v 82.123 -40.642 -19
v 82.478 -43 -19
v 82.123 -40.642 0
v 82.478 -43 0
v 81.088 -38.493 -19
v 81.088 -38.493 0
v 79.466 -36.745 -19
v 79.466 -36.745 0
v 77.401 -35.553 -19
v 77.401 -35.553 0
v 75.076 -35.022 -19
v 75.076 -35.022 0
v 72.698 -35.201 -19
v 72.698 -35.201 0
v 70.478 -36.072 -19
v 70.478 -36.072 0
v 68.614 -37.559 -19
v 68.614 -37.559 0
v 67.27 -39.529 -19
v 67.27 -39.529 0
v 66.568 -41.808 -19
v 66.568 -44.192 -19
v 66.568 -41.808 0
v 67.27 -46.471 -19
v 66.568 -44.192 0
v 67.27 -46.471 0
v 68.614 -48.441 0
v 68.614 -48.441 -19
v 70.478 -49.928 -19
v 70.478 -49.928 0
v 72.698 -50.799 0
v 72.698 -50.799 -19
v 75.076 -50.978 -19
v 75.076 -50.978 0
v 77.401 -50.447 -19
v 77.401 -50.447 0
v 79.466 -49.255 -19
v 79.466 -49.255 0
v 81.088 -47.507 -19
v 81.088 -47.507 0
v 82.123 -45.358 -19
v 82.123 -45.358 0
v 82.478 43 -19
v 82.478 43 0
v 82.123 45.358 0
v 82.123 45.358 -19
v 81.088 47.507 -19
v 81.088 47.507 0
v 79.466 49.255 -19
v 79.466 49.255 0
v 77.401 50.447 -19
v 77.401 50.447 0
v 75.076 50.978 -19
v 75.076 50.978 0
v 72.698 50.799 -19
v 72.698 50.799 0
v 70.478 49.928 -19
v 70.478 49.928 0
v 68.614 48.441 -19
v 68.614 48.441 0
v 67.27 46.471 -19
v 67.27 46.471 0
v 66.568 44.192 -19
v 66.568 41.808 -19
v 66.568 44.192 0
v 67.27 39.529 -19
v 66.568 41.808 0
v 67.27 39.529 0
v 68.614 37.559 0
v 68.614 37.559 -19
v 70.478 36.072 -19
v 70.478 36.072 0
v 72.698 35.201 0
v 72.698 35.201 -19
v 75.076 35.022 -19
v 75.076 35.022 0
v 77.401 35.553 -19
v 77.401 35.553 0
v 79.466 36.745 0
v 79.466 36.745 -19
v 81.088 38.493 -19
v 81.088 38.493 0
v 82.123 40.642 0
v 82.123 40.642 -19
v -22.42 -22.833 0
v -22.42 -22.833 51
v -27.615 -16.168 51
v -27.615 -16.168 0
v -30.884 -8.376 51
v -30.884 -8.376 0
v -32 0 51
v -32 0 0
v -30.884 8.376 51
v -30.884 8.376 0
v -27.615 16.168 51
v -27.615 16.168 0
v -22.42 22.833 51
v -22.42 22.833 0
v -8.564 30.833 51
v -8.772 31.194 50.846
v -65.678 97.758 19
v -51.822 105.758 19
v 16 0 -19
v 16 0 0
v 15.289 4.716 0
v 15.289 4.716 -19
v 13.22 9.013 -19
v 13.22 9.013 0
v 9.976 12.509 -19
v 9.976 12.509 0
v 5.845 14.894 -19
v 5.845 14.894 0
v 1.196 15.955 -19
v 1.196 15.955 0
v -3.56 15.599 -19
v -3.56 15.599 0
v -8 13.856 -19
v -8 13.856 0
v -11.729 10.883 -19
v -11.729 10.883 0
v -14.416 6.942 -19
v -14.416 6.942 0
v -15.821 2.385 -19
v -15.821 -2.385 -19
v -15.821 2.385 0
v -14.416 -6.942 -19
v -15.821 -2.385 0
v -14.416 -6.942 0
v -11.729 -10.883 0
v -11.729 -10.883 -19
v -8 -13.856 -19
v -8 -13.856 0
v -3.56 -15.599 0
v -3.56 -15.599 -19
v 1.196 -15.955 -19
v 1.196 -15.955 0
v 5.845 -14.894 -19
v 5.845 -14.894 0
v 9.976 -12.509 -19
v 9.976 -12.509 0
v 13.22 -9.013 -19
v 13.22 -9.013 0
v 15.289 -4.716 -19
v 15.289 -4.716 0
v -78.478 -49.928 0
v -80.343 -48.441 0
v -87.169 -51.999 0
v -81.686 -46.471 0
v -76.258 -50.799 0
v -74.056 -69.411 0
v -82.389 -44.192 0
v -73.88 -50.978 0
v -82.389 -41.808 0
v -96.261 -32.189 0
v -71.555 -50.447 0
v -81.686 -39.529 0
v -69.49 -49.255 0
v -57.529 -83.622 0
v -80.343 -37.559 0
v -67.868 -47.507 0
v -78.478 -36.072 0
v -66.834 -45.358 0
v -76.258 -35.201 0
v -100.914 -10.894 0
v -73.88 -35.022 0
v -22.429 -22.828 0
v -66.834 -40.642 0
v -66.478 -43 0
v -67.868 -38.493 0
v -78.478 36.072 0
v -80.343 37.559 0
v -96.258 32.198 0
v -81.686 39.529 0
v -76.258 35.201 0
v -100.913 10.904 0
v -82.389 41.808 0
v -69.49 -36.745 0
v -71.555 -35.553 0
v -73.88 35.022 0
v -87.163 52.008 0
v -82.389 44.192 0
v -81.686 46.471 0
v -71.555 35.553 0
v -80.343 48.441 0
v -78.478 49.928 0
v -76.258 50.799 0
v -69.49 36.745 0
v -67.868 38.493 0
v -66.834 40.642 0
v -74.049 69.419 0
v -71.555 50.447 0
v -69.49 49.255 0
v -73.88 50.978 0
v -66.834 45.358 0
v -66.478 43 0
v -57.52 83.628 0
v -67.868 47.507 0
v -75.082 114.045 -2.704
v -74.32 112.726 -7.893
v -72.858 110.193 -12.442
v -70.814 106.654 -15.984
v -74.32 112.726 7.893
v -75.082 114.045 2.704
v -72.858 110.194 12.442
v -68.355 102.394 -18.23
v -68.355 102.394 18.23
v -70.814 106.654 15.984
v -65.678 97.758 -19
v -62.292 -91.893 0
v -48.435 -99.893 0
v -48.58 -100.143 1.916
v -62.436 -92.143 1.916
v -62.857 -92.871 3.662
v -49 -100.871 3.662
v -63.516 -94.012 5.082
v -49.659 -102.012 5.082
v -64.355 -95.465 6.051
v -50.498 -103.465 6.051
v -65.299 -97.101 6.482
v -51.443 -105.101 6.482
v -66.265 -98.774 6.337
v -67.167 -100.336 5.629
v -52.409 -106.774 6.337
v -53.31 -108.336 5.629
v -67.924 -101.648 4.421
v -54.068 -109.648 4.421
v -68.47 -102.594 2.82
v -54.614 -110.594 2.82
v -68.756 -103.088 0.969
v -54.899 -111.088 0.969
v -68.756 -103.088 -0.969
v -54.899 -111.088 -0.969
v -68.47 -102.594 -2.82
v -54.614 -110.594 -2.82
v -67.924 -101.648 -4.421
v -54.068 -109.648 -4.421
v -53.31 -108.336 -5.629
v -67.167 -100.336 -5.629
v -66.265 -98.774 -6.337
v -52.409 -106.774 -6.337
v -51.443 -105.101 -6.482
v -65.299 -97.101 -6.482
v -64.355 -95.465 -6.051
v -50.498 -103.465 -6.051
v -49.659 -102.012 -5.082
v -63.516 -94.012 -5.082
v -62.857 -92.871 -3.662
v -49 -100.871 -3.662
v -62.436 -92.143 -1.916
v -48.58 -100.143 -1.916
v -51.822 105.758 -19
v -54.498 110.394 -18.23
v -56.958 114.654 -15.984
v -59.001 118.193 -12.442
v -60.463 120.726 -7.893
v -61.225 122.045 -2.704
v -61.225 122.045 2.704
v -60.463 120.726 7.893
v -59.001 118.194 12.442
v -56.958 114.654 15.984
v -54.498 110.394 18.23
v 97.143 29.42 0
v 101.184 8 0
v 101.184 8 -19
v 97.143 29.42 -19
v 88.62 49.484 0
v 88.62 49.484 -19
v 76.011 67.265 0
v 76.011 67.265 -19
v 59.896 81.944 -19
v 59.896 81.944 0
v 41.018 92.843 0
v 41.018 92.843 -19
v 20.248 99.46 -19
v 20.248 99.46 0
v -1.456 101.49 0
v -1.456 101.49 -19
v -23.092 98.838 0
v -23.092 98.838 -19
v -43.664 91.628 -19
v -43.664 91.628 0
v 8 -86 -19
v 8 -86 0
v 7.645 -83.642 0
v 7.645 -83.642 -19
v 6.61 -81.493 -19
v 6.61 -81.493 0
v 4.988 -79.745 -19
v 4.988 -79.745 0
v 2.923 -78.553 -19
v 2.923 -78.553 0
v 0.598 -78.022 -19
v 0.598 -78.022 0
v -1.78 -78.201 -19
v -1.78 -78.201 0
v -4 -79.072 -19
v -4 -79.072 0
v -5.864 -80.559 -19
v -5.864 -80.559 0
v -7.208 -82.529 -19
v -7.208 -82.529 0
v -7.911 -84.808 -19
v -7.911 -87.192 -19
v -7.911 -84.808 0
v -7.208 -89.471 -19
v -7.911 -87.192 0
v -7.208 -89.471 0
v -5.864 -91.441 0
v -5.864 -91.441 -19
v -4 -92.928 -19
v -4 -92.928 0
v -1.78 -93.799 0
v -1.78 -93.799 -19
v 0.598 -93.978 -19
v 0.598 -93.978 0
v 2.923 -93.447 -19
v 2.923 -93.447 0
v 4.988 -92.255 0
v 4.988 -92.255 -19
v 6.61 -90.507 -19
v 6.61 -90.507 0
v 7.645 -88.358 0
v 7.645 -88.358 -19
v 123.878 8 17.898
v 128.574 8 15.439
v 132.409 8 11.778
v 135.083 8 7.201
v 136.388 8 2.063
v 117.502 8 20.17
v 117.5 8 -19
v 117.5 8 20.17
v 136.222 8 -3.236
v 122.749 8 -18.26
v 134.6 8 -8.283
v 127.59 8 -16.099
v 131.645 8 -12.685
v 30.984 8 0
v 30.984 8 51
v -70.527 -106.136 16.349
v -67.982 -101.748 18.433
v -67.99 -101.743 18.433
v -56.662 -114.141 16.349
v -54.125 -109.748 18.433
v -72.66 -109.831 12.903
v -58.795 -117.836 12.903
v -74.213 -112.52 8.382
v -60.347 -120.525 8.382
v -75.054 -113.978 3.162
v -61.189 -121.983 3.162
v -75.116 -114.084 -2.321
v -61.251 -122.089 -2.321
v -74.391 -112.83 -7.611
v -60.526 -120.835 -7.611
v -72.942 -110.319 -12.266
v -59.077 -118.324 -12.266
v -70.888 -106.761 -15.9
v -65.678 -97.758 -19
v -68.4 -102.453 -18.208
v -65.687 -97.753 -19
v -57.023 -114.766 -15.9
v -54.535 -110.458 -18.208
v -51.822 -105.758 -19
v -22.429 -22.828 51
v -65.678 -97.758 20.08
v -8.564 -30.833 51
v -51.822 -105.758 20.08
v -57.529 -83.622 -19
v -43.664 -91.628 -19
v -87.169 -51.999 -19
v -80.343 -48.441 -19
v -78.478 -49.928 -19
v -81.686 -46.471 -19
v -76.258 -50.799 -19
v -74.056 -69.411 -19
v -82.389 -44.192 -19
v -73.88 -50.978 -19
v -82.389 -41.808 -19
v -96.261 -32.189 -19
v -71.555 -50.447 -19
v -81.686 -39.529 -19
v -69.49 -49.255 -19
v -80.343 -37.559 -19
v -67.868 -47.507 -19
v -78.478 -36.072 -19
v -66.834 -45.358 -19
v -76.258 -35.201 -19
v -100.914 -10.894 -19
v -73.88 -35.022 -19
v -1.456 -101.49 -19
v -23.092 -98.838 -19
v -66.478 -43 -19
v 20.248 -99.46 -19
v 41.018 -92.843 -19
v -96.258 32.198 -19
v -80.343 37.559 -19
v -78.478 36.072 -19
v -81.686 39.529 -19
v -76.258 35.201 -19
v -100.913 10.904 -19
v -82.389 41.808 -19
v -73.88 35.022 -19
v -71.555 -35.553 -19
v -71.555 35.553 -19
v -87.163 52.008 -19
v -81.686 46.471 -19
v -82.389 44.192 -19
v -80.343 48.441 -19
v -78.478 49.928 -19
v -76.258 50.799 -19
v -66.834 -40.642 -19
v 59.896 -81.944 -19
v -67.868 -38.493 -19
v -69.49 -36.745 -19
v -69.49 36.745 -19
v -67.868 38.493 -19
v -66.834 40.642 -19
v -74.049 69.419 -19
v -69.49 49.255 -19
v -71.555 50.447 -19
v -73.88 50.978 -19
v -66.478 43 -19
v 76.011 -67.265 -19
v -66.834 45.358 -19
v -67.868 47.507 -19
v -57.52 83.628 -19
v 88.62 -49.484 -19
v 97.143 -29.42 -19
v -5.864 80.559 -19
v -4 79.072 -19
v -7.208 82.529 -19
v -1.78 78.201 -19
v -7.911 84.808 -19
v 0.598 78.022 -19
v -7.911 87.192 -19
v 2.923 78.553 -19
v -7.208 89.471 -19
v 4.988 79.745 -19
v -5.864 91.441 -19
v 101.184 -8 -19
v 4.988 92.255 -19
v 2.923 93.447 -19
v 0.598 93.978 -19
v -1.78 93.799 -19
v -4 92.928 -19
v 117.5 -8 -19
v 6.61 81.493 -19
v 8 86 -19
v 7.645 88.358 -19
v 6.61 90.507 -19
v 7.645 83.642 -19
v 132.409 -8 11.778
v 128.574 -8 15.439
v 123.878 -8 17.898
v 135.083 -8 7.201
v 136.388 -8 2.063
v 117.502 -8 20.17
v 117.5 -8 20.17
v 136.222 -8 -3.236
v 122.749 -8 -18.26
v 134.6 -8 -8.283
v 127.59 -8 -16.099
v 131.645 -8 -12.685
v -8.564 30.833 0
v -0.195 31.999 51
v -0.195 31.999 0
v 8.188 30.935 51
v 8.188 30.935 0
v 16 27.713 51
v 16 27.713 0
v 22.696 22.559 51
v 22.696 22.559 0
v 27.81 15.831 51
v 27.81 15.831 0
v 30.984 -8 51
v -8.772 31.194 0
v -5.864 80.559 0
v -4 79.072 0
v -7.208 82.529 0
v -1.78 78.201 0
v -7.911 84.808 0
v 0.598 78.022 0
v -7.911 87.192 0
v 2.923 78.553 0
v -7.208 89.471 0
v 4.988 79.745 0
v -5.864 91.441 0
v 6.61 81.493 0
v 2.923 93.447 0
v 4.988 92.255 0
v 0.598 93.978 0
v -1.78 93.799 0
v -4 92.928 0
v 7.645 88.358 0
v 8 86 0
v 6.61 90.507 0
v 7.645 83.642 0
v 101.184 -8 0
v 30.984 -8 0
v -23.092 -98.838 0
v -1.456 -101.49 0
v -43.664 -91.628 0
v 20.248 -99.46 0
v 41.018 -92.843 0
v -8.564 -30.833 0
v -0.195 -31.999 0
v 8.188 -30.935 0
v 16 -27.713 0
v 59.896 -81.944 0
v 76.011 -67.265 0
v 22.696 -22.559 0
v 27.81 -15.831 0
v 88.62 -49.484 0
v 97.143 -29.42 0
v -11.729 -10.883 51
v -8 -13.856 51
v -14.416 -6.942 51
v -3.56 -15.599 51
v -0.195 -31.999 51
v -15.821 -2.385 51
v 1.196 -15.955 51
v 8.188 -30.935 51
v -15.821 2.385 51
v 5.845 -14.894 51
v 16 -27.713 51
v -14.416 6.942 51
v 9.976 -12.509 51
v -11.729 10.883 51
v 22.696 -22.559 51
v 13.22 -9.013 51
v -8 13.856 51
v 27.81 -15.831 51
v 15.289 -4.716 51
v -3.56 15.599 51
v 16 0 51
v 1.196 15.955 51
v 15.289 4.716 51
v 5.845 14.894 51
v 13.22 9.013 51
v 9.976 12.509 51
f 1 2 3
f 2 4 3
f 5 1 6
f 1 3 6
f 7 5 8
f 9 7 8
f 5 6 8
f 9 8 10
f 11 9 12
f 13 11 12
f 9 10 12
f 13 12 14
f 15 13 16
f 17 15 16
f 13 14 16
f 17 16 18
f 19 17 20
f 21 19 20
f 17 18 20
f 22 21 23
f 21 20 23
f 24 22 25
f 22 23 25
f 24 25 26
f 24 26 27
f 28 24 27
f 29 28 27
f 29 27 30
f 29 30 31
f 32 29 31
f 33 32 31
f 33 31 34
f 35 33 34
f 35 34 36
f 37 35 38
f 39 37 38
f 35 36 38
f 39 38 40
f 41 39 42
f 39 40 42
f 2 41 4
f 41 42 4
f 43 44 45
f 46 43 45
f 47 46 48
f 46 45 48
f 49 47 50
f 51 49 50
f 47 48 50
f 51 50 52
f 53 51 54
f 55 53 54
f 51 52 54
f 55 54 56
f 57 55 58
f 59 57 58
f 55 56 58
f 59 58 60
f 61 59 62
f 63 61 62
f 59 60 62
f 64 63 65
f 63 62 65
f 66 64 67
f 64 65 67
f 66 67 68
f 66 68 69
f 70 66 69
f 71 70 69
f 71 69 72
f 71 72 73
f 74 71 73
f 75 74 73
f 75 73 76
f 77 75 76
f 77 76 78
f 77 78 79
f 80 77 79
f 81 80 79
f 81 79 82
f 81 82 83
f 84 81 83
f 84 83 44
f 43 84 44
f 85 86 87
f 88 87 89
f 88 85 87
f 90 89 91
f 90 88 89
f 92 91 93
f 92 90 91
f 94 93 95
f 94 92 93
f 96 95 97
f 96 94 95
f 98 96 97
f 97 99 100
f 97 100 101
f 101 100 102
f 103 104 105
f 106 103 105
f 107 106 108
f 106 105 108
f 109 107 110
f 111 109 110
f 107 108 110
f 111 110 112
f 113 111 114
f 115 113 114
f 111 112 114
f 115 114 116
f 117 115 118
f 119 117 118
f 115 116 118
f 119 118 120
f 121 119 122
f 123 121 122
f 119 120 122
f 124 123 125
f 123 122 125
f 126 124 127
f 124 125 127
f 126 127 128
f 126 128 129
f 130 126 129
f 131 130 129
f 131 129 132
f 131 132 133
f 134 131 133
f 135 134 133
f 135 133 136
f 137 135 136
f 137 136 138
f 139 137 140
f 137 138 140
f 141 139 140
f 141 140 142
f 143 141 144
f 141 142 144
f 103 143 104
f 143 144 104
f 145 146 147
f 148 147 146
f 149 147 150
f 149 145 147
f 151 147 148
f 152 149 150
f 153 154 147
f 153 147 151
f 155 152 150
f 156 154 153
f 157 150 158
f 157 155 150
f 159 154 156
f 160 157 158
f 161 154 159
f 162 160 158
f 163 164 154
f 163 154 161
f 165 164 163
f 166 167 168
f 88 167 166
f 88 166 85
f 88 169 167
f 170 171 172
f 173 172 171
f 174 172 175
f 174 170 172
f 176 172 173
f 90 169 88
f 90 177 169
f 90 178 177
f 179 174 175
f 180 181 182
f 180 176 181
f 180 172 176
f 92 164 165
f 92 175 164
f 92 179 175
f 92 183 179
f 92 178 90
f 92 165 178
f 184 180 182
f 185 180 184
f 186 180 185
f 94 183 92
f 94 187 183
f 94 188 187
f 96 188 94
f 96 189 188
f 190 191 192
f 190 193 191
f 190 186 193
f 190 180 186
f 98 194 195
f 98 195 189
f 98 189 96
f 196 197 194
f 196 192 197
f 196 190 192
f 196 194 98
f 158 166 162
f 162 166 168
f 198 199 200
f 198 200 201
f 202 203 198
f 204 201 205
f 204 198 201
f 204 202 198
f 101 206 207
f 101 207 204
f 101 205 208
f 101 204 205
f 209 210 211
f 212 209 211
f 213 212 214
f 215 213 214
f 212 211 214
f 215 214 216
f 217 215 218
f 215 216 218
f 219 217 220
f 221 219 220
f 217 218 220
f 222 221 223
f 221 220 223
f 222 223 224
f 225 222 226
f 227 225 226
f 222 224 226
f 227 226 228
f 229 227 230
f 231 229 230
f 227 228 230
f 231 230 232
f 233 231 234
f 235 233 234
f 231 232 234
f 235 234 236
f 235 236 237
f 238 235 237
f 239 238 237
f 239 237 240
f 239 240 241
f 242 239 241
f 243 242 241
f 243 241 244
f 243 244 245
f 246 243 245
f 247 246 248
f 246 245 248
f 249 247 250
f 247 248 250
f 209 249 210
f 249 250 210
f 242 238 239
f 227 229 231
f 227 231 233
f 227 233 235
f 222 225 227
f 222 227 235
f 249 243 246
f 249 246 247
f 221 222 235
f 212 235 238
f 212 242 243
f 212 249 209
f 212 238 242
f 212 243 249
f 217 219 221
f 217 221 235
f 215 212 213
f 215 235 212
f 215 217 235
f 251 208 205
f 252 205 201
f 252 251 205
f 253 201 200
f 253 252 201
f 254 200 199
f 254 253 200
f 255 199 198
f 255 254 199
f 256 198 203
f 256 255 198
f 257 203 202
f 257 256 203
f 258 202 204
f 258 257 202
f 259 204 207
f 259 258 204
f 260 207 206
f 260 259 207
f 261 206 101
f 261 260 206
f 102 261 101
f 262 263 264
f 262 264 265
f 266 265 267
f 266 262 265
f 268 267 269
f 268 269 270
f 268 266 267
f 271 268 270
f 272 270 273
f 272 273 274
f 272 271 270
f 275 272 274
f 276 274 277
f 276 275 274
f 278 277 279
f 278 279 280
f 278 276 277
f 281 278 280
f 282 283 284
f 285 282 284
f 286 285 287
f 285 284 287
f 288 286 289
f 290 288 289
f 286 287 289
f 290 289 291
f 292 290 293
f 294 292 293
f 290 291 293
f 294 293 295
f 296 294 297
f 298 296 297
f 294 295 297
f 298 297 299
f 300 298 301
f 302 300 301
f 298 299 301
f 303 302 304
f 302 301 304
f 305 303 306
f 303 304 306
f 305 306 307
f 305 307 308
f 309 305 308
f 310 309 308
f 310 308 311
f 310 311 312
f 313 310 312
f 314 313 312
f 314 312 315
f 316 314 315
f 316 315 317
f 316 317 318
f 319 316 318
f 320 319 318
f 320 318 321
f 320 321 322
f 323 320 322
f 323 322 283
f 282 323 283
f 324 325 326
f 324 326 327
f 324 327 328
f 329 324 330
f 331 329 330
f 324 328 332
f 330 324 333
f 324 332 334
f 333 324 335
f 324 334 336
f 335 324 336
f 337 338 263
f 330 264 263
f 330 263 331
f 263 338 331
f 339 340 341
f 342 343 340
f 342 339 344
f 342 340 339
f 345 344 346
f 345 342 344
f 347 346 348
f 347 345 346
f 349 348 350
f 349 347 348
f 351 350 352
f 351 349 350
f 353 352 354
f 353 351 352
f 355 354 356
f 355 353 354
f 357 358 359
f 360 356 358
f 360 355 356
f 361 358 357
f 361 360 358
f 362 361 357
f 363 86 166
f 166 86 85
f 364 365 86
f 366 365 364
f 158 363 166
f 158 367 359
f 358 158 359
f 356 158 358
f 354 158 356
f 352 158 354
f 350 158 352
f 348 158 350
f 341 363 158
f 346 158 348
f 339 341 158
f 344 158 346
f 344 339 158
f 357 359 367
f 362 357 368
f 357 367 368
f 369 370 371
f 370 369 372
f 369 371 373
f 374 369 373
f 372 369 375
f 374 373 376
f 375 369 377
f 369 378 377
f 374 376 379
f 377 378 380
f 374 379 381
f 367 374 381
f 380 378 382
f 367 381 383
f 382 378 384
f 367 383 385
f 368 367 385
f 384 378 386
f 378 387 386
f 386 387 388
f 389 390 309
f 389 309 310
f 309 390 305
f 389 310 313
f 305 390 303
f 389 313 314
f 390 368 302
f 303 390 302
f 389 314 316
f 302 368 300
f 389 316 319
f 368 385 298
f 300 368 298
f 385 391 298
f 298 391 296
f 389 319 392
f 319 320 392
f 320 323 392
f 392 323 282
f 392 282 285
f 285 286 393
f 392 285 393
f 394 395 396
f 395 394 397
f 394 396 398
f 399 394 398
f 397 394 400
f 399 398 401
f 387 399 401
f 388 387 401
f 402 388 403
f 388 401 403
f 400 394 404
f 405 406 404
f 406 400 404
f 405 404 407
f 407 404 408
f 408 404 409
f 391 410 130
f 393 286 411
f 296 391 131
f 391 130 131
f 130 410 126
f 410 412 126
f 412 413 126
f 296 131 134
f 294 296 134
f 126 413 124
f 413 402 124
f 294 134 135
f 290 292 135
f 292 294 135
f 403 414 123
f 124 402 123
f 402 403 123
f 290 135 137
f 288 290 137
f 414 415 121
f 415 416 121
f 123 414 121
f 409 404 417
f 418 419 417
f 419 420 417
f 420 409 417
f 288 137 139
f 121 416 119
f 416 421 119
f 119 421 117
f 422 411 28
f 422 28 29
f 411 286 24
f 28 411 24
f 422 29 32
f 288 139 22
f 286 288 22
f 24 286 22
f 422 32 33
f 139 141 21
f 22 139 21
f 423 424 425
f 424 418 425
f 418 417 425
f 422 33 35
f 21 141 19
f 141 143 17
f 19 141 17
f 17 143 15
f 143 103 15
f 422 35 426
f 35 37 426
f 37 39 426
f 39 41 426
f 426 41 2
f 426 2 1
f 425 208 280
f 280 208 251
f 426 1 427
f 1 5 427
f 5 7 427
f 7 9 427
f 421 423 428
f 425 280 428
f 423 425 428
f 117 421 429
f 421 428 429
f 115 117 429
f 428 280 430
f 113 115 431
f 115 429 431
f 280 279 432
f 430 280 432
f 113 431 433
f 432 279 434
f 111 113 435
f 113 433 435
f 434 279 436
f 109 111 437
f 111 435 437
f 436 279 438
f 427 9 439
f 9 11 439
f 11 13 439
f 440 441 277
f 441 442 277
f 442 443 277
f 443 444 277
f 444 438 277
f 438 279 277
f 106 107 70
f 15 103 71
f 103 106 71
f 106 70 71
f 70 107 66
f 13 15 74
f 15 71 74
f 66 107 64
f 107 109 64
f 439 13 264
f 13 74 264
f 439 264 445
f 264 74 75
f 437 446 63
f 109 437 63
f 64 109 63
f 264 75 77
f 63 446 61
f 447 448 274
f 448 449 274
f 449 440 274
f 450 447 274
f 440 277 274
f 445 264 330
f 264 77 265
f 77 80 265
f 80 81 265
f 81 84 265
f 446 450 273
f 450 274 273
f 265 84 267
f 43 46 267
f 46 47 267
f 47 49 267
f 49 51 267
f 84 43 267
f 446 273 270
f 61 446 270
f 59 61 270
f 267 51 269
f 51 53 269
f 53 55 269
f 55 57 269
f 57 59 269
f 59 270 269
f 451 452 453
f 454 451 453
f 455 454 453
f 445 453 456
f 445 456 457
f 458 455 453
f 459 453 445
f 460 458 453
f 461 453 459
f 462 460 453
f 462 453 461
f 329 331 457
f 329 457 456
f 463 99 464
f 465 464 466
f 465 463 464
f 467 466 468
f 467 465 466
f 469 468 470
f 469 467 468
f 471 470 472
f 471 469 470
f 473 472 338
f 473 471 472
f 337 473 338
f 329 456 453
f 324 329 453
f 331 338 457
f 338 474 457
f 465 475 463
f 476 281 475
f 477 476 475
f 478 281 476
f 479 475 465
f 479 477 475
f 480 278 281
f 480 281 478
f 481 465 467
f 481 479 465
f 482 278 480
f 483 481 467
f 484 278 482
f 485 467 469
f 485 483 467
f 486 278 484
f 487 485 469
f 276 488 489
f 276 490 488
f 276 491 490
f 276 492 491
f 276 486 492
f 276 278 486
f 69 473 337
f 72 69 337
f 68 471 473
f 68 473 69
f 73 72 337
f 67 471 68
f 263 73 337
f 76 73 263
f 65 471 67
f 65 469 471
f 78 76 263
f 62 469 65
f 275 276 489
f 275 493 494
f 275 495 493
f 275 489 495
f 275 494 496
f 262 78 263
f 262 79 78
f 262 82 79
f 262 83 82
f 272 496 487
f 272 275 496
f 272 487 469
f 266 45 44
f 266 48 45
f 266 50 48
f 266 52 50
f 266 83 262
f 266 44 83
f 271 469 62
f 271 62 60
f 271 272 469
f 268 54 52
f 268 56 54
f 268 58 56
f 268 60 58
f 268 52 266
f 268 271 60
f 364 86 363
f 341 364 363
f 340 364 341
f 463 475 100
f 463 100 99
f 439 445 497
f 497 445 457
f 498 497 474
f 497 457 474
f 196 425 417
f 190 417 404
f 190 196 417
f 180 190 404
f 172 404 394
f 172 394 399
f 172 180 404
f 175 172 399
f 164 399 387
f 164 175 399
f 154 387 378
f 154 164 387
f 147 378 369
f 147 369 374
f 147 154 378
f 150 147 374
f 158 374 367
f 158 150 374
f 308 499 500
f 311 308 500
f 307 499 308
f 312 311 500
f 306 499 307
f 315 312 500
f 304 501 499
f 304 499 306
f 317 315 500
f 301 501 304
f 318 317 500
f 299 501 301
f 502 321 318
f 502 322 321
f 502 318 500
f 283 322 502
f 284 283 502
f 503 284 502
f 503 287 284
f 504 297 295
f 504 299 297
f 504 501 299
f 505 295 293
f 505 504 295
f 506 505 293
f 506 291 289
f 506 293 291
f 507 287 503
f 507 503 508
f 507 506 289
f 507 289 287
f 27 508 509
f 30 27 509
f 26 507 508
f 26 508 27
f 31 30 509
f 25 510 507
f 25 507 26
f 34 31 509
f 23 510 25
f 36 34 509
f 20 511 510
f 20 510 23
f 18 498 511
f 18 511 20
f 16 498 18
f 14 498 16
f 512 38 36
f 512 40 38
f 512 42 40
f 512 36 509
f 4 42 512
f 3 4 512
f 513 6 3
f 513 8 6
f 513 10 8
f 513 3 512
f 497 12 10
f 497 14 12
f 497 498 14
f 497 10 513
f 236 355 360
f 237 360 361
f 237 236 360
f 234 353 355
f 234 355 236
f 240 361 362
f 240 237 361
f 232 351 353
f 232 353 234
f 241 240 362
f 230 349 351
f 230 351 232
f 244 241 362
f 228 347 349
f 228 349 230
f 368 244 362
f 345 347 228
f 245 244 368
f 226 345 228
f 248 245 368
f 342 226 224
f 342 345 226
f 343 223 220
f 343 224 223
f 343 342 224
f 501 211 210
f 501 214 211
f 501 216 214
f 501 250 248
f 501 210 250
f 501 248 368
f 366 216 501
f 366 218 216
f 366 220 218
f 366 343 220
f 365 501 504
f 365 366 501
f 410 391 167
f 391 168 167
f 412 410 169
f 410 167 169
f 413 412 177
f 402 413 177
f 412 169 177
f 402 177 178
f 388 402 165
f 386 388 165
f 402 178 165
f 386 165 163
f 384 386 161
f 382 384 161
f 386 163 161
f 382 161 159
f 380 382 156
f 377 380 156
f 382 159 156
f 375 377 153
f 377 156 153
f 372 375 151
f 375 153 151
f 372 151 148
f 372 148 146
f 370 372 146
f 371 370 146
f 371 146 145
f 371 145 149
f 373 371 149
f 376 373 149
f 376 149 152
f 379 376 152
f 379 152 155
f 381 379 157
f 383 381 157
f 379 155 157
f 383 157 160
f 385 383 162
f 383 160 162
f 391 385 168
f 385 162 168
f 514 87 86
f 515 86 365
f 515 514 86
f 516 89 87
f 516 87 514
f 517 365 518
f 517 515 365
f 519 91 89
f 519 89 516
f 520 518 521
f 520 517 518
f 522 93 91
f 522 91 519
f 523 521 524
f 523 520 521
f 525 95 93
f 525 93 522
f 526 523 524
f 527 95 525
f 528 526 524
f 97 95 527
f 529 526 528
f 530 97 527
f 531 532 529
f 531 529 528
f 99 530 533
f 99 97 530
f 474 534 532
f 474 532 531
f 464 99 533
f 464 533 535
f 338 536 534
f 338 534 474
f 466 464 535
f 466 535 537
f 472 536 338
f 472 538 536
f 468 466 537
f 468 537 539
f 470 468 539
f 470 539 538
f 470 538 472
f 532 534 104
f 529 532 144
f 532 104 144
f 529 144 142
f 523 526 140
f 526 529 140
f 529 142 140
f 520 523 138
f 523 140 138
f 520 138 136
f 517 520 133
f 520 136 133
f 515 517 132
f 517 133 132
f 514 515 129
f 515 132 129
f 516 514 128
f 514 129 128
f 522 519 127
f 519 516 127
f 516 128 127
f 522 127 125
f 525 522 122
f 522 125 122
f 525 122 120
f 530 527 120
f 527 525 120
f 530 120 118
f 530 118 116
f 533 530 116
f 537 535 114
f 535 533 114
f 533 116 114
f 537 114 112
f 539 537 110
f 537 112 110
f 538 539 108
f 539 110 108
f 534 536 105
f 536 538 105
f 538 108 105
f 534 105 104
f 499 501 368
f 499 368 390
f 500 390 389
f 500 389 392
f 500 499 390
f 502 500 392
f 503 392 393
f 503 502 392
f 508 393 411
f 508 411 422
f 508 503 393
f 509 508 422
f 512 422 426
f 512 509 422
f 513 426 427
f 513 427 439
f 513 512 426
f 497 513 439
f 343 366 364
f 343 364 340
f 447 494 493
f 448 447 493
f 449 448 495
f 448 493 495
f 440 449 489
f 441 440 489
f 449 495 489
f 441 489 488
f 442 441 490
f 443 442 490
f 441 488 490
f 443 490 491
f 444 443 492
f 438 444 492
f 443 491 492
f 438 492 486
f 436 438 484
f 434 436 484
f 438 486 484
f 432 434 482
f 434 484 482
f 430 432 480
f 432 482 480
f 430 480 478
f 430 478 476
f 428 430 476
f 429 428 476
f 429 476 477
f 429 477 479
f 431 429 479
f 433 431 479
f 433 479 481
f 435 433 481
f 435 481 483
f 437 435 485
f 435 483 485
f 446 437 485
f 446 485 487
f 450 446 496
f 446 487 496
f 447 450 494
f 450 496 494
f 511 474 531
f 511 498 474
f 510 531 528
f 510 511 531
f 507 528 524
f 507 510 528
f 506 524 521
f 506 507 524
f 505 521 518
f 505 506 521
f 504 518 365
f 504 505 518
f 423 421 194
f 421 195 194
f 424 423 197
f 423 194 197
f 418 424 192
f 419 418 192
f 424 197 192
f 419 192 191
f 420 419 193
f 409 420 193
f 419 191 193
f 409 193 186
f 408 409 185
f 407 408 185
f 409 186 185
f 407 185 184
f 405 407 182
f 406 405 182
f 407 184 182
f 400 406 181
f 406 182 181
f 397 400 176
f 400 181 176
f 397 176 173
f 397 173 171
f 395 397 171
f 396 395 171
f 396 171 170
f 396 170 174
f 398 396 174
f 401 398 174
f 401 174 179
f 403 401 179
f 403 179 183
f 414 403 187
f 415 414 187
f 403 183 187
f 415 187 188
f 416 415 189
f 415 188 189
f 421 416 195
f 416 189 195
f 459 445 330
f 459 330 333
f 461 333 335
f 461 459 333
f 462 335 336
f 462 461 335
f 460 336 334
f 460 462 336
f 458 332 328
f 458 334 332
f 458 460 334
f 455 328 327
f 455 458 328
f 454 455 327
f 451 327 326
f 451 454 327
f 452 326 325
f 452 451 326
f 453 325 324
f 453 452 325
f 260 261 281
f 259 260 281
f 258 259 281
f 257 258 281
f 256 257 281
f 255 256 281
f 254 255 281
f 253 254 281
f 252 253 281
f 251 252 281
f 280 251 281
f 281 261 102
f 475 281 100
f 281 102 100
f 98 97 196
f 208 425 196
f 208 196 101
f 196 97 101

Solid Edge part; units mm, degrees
sketch "Sketch1" plane through (0, 0, 0) normal (0, 0, 1) x (1, 0, 0)
  circle A0 centre (0, 0) radius 101.5
extrude "Protrusion1" add sketch "Sketch1" against normal blind 19
sketch "Sketch2" plane through (0, 0, 0) normal (0, 0, 1) x (1, 0, 0)
  circle A0 centre (0, 0) radius 32
extrude "ExtrudedProtrusion_2" add sketch "Sketch2" along normal blind 51
sketch "Sketch3" plane through (0, 0, 0) normal (0, 0, 1) x (1, 0, 0)
  circle A0 centre (0, 0) radius 16
extrude "ExtrudedCutout_1" cut sketch "Sketch3" along normal blind 51
sketch "Sketch4" plane through (0, 0, 0) normal (0, 0, 1) x (1, 0, 0)
  circle A0 centre (0, 0) radius 16
extrude "ExtrudedCutout_2" cut sketch "Sketch4" against normal blind 19
sketch "Sketch5" plane through (0, 0, 0) normal (0, 0, 1) x (1, 0, 0)
  circle A0 centre (0, 86) radius 8
extrude "ExtrudedCutout_3" cut sketch "Sketch5" against normal blind 19
sketch "Sketch6" plane through (0, 0, 0) normal (0, 0, 1) x (1, 0, 0)
  circle A0 centre (74.4782, 43) radius 8
  circle A1 centre (74.4782, -43) radius 8
  circle A2 centre (0, -86) radius 8
  circle A3 centre (-74.4782, -43) radius 8
  circle A4 centre (-74.4782, 43) radius 8
  circle A5 centre (0, 86) radius 8
extrude "ExtrudedCutout_4" cut sketch "Sketch6" against normal blind 19
sketch "Sketch7" plane through (0, 0, 0) normal (0, 0, 1) x (0, 1, 0)
  line L0 (-105.758, 51.8218) -> (-30.8328, 8.5637)
  arc A0 (-30.8328, 8.5637) -> (-22.8328, 22.4201) centre (0, 0) cw
  line L1 (-22.8328, 22.4201) -> (-97.758, 65.6782)
  line L2 (-101.758, 58.75) -> (-97.758, 65.6782)
  line L3 (-101.758, 58.75) -> (-105.758, 51.8218)
  line L4 (105.758, 51.8218) -> (31.1942, 8.7724)
  line L5 (31.1942, 8.7724) -> (30.8328, 8.5637)
  arc A1 (22.8328, 22.4201) -> (30.8328, 8.5637) centre (0, 0) cw
  line L6 (22.8328, 22.4201) -> (97.758, 65.6782)
  line L7 (97.758, 65.6782) -> (105.758, 51.8218)
  line L8 (8, -30.9839) -> (8, -117.5)
  line L9 (0, -117.5) -> (8, -117.5)
  line L10 (0, -117.5) -> (-8, -117.5)
  line L11 (-8, -117.5) -> (-8, -30.9839)
  arc A2 (8, -30.9839) -> (-8, -30.9839) centre (0, 0) cw
extrude "ExtrudedProtrusion_5" add sketch "Sketch7" along normal blind 51
sketch "Sketch8" plane through (0, 0, 0) normal (0, 0, 1) x (0, 1, 0)
  line L0 (-105.758, 51.8218) -> (-30.8328, 8.5637)
  arc A0 (-30.8328, 8.5637) -> (-22.8328, 22.4201) centre (0, 0) cw
  line L1 (-22.8328, 22.4201) -> (-97.758, 65.6782)
  line L2 (-101.758, 58.75) -> (-97.758, 65.6782)
  line L3 (-101.758, 58.75) -> (-105.758, 51.8218)
  line L4 (-8, -117.5) -> (-8, -30.9839)
  line L5 (8, -30.9839) -> (8, -117.5)
  line L6 (0, -117.5) -> (8, -117.5)
  line L7 (0, -117.5) -> (-8, -117.5)
  arc A1 (8, -30.9839) -> (-8, -30.9839) centre (0, 0) cw
  line L8 (105.758, 51.8218) -> (31.1942, 8.7724)
  line L9 (31.1942, 8.7724) -> (30.8328, 8.5637)
  arc A2 (22.8328, 22.4201) -> (30.8328, 8.5637) centre (0, 0) cw
  line L10 (22.8328, 22.4201) -> (97.758, 65.6782)
  line L11 (97.758, 65.6782) -> (105.758, 51.8218)
extrude "ExtrudedProtrusion_6" add sketch "Sketch8" against normal blind 19
sketch "Sketch9" plane through (-30.1928, -68.2954, 16) normal (0.8660254, -0.5, 0) x (0.5, 0.8660254, 0)
  line L0 (-43.2581, 35) -> (43.2581, 35)
  line L1 (43.2581, 35) -> (-43.2581, 4.0795)
  line L2 (-43.2581, 4.0795) -> (-43.2581, 35)
extrude "ExtrudedCutout_5" cut sketch "Sketch9" against normal blind 16
sketch "Sketch10" plane through (-30.1928, -68.2954, 16) normal (0.8660254, -0.5, 0) x (0.5, 0.8660254, 0)
  arc A0 (-43.2581, -35) -> (-47.8653, 2.4329) centre (-43.2581, -16) cw
  line L0 (43.2581, 35) -> (-47.8653, 2.4329)
  line L1 (-43.2581, -35) -> (43.2581, -35)
  line L2 (43.2581, 35) -> (43.2581, -35)
extrude "ExtrudedProtrusion_7" add sketch "Sketch10" against normal blind 16
extrude "Cutout1" [suppressed]
extrude "ExtrudedCutout_7" [suppressed]
sketch "Sketch11" plane through (74.2419, -8, 16) normal (0, -1, 0) x (1, 0, 0)
  line L0 (-43.2581, -35) -> (43.2581, -35)
  line L1 (-43.2581, 35) -> (-43.2581, -35)
  line L2 (-43.2581, 35) -> (43.2601, 4.1696)
  line L3 (43.2601, 4.1696) -> (49.6358, 1.8976)
  arc A0 (49.6358, 1.8976) -> (43.2581, -35) centre (43.2581, -16) cw
extrude "Protrusion2" add sketch "Sketch11" against normal blind 16
sketch "Sketch12" plane through (74.2419, -8, 16) normal (0, -1, 0) x (1, 0, 0)
  line L0 (-43.2581, 35) -> (43.2581, 35)
  line L1 (43.2581, 35) -> (43.2601, 4.1696)
  line L2 (-43.2581, 35) -> (43.2601, 4.1696)
extrude "ExtrudedCutout_8" cut sketch "Sketch12" against normal blind 16
extrude "Cutout2" [suppressed]
sketch "Sketch13" plane through (-30.1928, -68.2954, 16) normal (0.8660254, -0.5, 0) x (0.5, 0.8660254, 0)
  arc A0 (-43.2581, -35) -> (-47.8653, 2.4329) centre (-43.2581, -16) cw
  line L0 (43.2581, 35) -> (-47.8653, 2.4329)
  line L1 (-43.2581, -35) -> (43.2581, -35)
  line L2 (43.2581, 35) -> (43.2581, -35)
extrude "ExtrudedProtrusion_13" add sketch "Sketch13" against normal blind 16.01
sketch "Sketch14" plane through (-30.1928, -68.2954, 16) normal (0.8660254, -0.5, 0) x (0.5, 0.8660254, 0)
  circle A0 centre (-42.9854, -16) radius 6.5
extrude "Cutout3" cut sketch "Sketch14" against normal blind 16
sketch "Sketch15" plane through (-30.1928, 68.2954, 16) normal (0.8660254, 0.5, 0) x (-0.5, 0.8660254, 0)
  line L0 (43.2581, -35) -> (43.2581, 3)
  arc A0 (43.2581, 3) -> (43.2581, -35) centre (43.2581, -16) cw
extrude "ExtrudedProtrusion_14" add sketch "Sketch15" against normal blind 16
sketch "Sketch16" plane through (-30.1928, 68.2954, 16) normal (0.8660254, 0.5, 0) x (-0.5, 0.8660254, 0)
  line L0 (43.2581, 35) -> (-43.2581, 35)
  line L1 (-43.2581, 35) -> (43.2581, 3)
  line L2 (43.2581, 3) -> (43.2581, 35)
extrude "Cutout4" cut sketch "Sketch16" against normal blind 16
